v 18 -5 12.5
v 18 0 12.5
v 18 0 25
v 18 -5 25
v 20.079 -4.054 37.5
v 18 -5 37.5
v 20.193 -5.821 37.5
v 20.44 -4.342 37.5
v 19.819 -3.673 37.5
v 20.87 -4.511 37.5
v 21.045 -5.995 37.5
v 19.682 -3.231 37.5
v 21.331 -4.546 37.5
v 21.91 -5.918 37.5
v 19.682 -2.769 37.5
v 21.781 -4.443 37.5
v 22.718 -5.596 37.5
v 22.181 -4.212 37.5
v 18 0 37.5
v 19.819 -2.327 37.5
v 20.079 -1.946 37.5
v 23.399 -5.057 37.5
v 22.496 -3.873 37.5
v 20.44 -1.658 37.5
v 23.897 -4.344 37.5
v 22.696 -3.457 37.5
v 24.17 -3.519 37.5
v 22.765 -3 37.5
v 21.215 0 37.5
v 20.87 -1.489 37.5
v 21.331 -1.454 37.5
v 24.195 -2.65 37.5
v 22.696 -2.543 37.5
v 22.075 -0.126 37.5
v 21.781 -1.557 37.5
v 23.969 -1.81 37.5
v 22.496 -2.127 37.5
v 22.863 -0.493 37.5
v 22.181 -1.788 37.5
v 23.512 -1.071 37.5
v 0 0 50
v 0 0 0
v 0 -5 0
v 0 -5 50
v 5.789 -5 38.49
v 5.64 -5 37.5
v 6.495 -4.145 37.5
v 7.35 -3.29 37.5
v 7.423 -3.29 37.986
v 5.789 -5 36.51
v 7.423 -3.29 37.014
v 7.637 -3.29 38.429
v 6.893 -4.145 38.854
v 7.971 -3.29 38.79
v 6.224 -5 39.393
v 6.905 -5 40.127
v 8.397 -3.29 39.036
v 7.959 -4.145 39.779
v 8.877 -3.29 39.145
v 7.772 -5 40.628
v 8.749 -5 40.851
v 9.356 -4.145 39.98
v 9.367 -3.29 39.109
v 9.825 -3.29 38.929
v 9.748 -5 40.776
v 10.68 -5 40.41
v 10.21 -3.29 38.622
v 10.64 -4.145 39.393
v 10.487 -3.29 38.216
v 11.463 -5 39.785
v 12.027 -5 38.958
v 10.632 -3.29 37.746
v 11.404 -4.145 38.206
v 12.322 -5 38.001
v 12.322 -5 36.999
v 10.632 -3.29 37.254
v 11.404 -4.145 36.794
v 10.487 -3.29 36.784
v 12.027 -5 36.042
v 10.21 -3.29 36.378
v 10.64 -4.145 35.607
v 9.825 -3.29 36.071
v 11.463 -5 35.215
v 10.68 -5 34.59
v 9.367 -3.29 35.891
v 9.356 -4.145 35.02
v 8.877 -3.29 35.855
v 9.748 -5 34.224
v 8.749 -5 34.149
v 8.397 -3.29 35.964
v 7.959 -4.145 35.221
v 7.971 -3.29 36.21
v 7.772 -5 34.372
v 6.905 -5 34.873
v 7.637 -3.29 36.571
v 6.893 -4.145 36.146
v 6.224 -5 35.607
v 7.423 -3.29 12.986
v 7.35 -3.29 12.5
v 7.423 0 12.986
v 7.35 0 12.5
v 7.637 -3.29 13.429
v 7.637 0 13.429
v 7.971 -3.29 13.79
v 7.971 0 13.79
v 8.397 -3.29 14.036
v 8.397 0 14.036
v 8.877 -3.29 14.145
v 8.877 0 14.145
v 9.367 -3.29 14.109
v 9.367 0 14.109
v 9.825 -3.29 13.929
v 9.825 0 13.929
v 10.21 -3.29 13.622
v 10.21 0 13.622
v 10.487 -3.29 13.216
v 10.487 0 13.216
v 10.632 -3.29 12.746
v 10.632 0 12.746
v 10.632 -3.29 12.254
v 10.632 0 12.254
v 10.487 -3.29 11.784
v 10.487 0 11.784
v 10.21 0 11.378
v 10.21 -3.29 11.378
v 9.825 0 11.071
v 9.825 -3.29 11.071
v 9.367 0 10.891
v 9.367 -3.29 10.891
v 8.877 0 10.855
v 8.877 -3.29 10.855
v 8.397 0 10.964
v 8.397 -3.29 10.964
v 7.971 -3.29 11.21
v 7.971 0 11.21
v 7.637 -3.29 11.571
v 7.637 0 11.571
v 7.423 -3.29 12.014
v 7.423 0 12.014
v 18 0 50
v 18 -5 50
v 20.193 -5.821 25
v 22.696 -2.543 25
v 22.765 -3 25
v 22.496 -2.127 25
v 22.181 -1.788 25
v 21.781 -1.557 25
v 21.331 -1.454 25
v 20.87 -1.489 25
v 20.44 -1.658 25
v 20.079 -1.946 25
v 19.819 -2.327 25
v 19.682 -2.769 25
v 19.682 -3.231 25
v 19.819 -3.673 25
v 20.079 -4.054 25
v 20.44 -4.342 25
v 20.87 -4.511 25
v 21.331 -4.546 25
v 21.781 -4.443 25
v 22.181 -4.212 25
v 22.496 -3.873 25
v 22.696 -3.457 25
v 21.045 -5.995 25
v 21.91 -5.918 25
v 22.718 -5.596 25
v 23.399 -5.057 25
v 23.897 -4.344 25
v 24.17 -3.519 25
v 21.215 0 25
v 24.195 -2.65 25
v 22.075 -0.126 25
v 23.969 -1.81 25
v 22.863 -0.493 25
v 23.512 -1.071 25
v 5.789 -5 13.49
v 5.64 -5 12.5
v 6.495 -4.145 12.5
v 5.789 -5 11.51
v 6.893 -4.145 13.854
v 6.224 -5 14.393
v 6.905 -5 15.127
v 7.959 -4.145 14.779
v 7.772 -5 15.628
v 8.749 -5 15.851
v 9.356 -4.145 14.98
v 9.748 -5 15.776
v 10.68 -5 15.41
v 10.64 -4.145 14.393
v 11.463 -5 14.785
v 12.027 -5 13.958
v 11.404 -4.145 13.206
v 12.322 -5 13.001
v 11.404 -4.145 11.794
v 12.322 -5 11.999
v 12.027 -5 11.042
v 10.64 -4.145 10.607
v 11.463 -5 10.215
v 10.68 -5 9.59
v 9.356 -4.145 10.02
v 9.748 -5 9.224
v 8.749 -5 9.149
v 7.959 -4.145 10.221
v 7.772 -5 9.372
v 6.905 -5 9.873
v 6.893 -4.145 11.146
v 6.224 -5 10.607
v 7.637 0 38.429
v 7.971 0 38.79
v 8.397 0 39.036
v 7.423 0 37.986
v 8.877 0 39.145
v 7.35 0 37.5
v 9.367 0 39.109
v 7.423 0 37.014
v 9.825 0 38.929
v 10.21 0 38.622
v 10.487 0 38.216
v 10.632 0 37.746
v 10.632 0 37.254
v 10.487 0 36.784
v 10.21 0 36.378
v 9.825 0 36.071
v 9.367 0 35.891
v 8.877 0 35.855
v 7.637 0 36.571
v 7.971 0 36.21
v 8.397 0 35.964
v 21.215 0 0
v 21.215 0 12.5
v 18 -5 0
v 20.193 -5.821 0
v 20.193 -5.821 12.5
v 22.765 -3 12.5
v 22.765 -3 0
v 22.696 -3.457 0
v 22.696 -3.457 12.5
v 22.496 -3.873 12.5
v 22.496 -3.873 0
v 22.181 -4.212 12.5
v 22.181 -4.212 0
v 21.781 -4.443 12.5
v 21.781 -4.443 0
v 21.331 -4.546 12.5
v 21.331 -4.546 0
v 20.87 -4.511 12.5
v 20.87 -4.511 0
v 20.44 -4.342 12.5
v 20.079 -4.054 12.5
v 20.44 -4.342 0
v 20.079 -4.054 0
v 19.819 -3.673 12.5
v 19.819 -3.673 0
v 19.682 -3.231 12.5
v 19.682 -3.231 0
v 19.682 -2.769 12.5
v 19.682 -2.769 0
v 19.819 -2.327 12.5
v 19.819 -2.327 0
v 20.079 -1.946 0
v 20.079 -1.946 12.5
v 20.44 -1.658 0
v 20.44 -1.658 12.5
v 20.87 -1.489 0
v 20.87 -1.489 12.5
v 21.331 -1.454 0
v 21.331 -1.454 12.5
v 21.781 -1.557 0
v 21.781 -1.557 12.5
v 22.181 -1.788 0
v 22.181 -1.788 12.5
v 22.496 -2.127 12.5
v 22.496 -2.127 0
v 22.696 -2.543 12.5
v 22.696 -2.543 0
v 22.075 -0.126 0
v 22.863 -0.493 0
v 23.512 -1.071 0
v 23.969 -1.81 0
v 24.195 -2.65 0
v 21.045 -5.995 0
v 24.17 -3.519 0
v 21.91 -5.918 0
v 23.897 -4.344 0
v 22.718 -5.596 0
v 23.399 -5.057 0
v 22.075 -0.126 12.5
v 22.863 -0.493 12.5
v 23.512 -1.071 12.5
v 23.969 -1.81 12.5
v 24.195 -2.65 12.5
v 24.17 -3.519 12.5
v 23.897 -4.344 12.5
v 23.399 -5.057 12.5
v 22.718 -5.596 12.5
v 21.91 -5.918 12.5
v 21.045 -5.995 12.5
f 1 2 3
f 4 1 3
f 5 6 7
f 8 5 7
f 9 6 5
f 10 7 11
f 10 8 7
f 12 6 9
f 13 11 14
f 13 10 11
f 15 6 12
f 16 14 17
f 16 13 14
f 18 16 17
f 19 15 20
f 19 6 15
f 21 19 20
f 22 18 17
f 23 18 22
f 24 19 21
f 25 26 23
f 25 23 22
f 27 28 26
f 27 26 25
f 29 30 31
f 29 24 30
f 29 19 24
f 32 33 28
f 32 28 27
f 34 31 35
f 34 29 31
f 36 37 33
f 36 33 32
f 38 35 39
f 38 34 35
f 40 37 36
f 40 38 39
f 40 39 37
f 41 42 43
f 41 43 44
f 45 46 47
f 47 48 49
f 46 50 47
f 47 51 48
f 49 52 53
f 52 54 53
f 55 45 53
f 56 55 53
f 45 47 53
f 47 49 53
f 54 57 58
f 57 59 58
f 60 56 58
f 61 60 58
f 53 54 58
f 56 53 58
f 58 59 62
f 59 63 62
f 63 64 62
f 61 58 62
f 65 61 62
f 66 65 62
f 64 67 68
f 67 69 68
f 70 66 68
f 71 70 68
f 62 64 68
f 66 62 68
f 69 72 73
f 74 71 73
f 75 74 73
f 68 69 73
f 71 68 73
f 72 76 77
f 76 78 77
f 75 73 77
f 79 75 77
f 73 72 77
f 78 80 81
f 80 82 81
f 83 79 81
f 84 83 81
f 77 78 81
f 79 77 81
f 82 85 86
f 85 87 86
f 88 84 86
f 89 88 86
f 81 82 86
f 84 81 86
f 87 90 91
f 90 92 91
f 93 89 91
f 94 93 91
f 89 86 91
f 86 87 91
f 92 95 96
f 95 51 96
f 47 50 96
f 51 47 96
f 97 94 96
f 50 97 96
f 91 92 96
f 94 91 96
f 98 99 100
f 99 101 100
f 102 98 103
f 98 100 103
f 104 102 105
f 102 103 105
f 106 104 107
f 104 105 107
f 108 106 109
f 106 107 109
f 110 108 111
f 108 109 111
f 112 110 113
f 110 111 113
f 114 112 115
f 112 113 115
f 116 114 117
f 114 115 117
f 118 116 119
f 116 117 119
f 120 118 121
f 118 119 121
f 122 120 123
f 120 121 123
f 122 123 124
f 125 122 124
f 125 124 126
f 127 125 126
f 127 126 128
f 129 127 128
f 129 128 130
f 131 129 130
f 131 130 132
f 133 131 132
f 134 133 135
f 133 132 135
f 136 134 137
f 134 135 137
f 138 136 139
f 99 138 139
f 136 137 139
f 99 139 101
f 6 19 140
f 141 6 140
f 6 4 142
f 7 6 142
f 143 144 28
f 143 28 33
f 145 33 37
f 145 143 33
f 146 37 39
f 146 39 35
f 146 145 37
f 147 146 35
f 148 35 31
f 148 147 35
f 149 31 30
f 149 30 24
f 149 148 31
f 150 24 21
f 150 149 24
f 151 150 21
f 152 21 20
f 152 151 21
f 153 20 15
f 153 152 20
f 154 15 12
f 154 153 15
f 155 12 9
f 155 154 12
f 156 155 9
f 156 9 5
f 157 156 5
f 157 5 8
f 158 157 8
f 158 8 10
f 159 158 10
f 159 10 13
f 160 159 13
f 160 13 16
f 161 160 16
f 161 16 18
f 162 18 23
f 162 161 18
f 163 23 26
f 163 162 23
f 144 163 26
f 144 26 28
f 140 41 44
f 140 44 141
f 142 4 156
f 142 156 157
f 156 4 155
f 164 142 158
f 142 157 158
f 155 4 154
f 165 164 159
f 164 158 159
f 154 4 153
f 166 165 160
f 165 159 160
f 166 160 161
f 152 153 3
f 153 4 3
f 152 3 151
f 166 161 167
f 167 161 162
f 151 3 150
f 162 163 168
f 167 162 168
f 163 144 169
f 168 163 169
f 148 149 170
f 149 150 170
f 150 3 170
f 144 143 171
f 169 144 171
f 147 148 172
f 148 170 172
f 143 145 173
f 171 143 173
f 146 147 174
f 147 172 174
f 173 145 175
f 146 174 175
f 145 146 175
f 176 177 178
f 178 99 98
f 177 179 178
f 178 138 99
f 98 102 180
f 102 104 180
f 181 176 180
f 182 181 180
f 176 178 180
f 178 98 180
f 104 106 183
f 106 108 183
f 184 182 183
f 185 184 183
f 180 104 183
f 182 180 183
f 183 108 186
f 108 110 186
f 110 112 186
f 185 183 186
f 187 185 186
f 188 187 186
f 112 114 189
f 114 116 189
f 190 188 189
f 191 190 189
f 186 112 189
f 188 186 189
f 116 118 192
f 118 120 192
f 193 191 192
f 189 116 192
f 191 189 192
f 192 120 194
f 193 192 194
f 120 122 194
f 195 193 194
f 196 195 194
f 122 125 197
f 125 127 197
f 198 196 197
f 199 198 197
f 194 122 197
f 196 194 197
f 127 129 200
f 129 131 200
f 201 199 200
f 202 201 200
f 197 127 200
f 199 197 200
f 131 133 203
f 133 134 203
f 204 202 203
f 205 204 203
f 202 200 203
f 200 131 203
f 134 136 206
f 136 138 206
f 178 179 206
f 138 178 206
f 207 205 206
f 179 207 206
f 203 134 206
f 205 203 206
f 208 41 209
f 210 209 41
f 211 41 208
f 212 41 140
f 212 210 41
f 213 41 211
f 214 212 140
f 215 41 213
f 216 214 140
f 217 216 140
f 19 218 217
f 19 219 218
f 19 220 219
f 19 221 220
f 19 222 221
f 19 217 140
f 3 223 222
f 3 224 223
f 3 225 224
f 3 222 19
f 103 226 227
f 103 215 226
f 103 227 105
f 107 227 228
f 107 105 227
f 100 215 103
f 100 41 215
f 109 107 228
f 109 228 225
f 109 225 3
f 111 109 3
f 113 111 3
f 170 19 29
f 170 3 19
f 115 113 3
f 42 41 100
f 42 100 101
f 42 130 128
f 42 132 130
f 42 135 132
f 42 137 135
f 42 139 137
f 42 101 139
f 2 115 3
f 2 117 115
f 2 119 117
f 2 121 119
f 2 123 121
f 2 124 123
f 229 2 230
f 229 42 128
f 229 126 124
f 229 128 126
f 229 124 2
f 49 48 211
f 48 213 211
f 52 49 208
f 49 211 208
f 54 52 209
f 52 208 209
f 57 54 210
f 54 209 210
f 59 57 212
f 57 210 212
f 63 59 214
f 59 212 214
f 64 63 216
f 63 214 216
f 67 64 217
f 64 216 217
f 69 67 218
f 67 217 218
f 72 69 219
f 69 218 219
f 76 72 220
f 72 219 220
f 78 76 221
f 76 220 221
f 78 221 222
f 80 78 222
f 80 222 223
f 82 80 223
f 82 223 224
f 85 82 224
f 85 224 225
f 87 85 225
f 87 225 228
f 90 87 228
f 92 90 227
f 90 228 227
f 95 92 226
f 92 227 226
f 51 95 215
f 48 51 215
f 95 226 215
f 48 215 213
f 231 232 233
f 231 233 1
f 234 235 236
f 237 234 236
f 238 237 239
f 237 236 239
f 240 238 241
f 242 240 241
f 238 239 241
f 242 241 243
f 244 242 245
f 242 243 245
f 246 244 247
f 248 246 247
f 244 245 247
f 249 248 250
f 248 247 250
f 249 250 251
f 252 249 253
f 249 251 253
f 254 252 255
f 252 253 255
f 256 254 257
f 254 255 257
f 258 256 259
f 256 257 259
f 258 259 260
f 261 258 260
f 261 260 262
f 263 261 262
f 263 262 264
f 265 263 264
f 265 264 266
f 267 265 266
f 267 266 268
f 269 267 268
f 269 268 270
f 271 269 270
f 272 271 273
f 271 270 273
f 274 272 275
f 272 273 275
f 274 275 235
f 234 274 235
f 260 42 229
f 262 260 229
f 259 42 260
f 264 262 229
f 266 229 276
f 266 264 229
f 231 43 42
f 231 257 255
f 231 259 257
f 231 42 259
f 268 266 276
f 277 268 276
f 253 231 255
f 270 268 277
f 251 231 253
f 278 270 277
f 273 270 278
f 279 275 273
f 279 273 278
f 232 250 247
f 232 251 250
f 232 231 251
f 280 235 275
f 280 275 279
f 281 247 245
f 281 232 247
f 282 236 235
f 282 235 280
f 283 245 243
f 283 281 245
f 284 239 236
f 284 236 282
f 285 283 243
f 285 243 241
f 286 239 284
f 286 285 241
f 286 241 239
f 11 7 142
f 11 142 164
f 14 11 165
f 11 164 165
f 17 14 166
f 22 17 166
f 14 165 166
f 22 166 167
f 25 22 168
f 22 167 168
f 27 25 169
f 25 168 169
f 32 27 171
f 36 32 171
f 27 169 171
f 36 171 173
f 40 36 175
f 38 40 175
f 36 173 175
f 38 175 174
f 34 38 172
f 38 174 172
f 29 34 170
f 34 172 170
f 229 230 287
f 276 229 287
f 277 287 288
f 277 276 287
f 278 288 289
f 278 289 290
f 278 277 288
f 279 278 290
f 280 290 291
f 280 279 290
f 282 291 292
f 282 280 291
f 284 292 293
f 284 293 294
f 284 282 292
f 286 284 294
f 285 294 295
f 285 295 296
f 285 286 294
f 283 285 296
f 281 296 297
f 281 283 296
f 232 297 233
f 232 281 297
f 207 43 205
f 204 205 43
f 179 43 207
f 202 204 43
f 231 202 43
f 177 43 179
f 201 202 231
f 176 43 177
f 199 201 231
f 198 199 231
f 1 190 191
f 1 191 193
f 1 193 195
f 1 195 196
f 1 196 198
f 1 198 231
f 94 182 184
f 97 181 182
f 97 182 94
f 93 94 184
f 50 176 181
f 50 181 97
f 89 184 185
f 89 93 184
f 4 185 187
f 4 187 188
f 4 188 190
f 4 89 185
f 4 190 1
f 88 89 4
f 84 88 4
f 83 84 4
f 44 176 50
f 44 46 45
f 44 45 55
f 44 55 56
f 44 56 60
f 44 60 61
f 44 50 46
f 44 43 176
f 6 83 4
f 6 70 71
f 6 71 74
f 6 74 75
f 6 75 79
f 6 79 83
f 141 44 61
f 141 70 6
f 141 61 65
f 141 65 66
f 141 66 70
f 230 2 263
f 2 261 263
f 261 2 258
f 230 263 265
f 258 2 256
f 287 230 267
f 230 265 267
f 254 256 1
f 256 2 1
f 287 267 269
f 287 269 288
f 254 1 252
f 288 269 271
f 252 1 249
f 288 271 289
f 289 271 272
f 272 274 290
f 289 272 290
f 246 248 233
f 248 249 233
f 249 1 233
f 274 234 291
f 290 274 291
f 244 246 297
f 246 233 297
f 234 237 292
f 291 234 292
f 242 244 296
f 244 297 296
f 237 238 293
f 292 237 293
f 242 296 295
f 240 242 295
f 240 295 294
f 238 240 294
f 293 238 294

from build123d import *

# Parameters (mm, degrees)
F0_W           = 18
F0_H           = 50
F1_DEPTH       = 5
F2_R           = 1.55
F3_DEPTH       = 12.5
F5_R           = 1.55
F6_DEPTH       = 12.5
F8_D           = 3.3
F8_DEPTH       = 40
F8_CSINK_D     = 6.72
F8_CSINK_ANGLE = 90
F8_TIP         = 0.9914200214


with BuildPart() as f1:
    # F0 (on Front) → F1 (new body)
    with BuildSketch(Plane.XZ):
        with Locations((9, 25)):
            Rectangle(F0_W, F0_H)
    extrude(amount=F1_DEPTH)

    # F2 (on face) → F3 (join)
    with BuildSketch(Plane(origin=(0, 0, 0), x_dir=(1, 0, 0), z_dir=(0, 0, -1))):
        with BuildLine():
            Line((18, 0), (21.2150048465, 0))
            ThreePointArc((21.2150048465, 0), (24.1698076743, 3.5187872861), (20.1930620863, 5.8205731678))
            Line((20.1930620863, 5.8205731678), (18, 5))
            Line((18, 5), (18, 0))
        make_face()
        with Locations((21.2150048465, 3)):
            Circle(F2_R, mode=Mode.SUBTRACT)
    extrude(amount=-F3_DEPTH)

    # F5 (on offset) → F6 (join)
    with BuildSketch(Plane.XY.offset(25)):
        with BuildLine():
            Line((18, 0), (18, -5))
            Line((18, -5), (20.1930620863, -5.8205731678))
            ThreePointArc((20.1930620863, -5.8205731678), (24.1698076743, -3.5187872861), (21.2150048465, 0))
            Line((21.2150048465, 0), (18, 0))
        make_face()
        with Locations((21.2150048465, -3)):
            Circle(F5_R, mode=Mode.SUBTRACT)
    extrude(amount=F6_DEPTH)

    # F8
    with Locations(Plane.XZ.offset(5)):
        with Locations((9, 37.5), (9, 12.5)):
            CounterSinkHole(F8_D / 2, F8_CSINK_D / 2, depth=F8_DEPTH, counter_sink_angle=F8_CSINK_ANGLE)
            with Locations((0, 0, -(F8_DEPTH + F8_TIP / 2))):  # 118° drill point
                Cone(0, F8_D / 2, F8_TIP, mode=Mode.SUBTRACT)


solid = f1.part
